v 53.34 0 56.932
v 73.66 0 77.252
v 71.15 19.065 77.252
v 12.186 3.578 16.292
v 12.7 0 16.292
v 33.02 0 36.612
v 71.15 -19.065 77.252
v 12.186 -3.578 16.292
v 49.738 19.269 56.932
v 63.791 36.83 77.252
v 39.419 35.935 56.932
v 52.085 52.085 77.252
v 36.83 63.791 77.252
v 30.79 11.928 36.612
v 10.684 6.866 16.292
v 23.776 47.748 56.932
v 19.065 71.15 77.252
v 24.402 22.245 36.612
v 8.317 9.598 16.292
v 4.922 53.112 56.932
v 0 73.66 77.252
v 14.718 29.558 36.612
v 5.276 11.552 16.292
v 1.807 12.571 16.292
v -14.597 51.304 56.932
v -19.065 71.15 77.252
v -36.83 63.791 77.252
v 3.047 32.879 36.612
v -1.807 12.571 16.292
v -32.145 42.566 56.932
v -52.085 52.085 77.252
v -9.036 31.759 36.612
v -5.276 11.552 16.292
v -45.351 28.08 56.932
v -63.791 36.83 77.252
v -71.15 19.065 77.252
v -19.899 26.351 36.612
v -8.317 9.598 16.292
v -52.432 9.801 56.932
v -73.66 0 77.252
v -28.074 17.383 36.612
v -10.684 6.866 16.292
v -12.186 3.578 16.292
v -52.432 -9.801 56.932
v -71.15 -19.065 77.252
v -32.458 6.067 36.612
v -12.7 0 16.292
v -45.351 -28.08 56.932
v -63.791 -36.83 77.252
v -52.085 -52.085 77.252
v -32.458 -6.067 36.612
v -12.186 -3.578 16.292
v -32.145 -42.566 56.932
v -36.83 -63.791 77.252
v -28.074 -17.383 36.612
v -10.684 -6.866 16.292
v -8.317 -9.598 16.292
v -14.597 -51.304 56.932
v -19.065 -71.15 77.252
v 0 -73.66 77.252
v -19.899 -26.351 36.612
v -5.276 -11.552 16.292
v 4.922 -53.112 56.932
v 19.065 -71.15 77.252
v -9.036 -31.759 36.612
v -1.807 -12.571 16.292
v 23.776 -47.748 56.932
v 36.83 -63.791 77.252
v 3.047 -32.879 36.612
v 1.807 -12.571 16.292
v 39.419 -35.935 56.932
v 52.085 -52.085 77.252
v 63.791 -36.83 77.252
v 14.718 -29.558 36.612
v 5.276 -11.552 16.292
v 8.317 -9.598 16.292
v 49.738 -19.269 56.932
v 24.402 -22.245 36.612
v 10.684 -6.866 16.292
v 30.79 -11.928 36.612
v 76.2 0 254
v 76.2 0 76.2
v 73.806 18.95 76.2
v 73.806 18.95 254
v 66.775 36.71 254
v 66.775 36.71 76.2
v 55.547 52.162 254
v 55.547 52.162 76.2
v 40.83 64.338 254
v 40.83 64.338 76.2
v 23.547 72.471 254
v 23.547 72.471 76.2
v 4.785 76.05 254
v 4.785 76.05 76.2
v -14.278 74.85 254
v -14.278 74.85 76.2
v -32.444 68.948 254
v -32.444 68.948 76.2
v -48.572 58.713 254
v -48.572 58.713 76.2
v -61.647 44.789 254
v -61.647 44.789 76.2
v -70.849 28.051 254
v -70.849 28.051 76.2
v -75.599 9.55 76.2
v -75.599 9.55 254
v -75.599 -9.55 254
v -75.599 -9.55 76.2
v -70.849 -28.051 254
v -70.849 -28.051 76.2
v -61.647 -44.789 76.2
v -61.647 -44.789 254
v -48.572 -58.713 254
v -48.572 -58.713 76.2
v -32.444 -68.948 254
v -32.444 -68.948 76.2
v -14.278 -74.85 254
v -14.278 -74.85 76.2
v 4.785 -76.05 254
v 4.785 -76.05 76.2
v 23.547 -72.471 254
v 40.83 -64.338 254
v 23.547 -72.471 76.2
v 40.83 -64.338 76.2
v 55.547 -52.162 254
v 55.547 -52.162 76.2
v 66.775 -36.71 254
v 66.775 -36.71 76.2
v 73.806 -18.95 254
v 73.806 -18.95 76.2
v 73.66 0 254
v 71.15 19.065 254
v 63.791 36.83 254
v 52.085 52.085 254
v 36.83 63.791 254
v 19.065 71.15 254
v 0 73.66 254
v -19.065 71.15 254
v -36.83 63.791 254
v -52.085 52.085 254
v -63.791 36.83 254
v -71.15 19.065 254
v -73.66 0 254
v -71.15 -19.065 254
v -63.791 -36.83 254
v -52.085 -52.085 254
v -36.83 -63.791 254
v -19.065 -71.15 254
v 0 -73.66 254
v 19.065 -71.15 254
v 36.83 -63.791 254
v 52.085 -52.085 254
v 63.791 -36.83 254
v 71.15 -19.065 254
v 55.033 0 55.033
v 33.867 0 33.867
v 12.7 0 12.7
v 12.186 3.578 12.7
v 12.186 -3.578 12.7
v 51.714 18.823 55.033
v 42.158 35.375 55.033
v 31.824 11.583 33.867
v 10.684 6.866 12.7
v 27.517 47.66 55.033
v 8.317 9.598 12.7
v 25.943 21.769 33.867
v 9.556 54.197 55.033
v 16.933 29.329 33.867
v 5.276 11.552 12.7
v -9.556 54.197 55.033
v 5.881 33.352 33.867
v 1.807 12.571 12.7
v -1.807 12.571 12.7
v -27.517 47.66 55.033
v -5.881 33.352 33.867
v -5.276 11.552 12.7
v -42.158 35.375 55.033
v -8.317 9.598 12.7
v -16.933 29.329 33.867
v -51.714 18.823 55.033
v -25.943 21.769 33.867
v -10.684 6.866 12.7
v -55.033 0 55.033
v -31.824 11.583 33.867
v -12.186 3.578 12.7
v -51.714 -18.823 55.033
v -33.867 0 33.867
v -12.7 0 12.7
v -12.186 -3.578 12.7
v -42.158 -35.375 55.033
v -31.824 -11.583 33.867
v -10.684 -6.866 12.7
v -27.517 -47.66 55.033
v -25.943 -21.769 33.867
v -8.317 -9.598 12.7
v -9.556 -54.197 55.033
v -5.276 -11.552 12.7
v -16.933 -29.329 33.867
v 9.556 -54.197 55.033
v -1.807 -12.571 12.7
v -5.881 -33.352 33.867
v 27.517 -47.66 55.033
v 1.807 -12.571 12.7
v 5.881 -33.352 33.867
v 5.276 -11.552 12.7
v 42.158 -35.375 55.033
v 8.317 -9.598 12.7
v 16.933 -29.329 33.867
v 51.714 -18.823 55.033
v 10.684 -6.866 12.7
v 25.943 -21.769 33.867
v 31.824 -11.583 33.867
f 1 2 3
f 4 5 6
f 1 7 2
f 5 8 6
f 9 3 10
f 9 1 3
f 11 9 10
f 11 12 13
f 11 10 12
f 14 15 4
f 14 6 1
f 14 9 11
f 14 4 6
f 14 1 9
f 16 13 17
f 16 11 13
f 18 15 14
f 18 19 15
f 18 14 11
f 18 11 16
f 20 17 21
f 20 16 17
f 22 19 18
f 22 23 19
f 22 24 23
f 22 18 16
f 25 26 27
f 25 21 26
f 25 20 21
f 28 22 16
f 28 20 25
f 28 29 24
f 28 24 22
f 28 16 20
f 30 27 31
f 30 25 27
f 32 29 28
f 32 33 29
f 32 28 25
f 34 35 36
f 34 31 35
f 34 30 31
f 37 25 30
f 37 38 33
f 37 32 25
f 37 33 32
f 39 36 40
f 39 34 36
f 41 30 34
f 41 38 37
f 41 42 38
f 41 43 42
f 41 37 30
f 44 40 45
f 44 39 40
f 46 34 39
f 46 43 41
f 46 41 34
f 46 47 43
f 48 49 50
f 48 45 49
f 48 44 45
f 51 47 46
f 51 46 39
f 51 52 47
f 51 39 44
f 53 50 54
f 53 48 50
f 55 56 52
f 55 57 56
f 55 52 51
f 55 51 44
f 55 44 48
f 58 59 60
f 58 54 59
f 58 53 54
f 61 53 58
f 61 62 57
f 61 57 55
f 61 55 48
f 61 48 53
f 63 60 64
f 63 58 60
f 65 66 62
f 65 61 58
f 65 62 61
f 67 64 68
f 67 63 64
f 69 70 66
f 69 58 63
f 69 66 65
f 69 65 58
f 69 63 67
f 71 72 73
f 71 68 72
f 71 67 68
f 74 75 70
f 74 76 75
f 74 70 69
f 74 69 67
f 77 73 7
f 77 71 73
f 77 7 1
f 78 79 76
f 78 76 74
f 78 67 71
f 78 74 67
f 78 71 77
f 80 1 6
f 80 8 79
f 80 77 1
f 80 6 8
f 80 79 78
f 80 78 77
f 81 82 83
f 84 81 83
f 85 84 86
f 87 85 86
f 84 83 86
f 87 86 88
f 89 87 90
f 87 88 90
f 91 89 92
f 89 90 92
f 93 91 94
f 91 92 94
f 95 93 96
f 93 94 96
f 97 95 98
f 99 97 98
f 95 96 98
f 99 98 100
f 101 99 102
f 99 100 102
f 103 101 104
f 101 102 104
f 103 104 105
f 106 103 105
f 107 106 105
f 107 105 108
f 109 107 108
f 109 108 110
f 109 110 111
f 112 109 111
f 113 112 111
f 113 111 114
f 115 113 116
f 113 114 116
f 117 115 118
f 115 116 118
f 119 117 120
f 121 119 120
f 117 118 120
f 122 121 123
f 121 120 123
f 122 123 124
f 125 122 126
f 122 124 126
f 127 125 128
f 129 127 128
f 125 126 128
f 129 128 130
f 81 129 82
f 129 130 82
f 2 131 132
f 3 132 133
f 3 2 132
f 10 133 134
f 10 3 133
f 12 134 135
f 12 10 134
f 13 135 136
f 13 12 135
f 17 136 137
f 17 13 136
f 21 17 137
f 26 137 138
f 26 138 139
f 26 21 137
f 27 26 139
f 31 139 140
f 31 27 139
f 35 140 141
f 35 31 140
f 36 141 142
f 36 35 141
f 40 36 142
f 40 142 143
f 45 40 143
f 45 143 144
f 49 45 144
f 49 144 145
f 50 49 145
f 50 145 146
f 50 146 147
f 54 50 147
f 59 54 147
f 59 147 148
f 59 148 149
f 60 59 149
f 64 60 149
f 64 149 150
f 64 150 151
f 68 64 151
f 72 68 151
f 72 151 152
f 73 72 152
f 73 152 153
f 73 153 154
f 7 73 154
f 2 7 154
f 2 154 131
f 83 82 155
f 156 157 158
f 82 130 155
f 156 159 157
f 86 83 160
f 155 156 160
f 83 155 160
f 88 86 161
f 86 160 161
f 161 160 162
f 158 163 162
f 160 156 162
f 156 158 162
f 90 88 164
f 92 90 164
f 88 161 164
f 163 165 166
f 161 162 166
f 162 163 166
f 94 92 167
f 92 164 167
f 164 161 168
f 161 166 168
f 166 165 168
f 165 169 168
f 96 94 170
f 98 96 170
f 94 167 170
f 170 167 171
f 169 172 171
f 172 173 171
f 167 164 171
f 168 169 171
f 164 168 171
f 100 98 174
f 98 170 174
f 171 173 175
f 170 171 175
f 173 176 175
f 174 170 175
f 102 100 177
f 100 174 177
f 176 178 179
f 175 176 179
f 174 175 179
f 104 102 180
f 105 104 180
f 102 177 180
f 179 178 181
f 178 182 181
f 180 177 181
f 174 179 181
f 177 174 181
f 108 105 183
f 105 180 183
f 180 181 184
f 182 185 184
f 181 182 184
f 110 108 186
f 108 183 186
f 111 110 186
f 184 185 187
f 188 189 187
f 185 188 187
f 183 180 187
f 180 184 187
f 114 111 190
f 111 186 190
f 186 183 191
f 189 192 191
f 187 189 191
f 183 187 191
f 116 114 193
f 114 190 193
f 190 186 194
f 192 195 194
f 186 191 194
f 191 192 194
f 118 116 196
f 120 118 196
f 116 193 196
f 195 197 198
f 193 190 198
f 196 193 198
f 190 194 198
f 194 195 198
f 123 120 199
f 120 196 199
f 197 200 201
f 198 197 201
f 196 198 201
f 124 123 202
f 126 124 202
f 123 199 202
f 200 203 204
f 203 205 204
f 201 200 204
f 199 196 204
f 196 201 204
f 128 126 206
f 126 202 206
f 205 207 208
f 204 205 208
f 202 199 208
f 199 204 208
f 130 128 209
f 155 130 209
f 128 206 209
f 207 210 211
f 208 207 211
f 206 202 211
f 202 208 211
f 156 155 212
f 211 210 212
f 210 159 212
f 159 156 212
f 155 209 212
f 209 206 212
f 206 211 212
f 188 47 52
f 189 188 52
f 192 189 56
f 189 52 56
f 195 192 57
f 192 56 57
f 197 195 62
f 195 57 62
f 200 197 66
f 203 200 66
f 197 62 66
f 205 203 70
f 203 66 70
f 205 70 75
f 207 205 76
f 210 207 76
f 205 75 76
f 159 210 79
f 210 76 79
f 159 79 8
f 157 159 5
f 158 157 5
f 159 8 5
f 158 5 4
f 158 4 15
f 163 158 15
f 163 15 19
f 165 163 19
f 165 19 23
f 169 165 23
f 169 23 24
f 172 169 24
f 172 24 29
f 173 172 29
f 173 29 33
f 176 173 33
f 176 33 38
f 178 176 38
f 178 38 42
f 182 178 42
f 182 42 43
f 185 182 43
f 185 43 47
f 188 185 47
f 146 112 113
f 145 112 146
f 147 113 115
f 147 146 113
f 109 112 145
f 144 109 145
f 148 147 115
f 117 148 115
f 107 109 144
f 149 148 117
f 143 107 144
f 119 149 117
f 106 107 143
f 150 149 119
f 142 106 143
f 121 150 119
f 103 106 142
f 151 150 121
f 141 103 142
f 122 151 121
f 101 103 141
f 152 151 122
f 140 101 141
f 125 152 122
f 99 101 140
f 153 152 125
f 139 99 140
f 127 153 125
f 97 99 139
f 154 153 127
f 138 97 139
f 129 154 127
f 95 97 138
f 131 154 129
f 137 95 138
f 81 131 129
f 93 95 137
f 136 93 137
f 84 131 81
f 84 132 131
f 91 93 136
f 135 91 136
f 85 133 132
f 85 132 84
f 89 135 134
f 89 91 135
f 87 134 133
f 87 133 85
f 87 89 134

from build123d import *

# Parameters (mm, degrees)
F0_R     = 76.2
F1_DEPTH = 254
F2_SIZE  = 76.2
F4_T     = -2.54
F5_D     = 25.4


with BuildPart() as f1:
    # F0 (on Top) → F1 (new body)
    with BuildSketch(Plane.XY):
        Circle(F0_R)
    extrude(amount=F1_DEPTH)

    # F2
    f2_edges = [f1.edges().sort_by_distance(p)[0] for p in [
        (-76.2, 0, 0),
    ]]
    chamfer(f2_edges, length=F2_SIZE)

    # F4
    f4_openings = [f1.faces().sort_by_distance(p)[0] for p in [
        (0, 0, 254),
    ]]
    offset(amount=F4_T, openings=f4_openings)

    # F5 (through all)
    with Locations(Plane(origin=(0, 0, 0), x_dir=(1, 0, 0), z_dir=(0, 0, -1))):
        with Locations((0, 0)):
            Hole(F5_D / 2)


solid = f1.part
